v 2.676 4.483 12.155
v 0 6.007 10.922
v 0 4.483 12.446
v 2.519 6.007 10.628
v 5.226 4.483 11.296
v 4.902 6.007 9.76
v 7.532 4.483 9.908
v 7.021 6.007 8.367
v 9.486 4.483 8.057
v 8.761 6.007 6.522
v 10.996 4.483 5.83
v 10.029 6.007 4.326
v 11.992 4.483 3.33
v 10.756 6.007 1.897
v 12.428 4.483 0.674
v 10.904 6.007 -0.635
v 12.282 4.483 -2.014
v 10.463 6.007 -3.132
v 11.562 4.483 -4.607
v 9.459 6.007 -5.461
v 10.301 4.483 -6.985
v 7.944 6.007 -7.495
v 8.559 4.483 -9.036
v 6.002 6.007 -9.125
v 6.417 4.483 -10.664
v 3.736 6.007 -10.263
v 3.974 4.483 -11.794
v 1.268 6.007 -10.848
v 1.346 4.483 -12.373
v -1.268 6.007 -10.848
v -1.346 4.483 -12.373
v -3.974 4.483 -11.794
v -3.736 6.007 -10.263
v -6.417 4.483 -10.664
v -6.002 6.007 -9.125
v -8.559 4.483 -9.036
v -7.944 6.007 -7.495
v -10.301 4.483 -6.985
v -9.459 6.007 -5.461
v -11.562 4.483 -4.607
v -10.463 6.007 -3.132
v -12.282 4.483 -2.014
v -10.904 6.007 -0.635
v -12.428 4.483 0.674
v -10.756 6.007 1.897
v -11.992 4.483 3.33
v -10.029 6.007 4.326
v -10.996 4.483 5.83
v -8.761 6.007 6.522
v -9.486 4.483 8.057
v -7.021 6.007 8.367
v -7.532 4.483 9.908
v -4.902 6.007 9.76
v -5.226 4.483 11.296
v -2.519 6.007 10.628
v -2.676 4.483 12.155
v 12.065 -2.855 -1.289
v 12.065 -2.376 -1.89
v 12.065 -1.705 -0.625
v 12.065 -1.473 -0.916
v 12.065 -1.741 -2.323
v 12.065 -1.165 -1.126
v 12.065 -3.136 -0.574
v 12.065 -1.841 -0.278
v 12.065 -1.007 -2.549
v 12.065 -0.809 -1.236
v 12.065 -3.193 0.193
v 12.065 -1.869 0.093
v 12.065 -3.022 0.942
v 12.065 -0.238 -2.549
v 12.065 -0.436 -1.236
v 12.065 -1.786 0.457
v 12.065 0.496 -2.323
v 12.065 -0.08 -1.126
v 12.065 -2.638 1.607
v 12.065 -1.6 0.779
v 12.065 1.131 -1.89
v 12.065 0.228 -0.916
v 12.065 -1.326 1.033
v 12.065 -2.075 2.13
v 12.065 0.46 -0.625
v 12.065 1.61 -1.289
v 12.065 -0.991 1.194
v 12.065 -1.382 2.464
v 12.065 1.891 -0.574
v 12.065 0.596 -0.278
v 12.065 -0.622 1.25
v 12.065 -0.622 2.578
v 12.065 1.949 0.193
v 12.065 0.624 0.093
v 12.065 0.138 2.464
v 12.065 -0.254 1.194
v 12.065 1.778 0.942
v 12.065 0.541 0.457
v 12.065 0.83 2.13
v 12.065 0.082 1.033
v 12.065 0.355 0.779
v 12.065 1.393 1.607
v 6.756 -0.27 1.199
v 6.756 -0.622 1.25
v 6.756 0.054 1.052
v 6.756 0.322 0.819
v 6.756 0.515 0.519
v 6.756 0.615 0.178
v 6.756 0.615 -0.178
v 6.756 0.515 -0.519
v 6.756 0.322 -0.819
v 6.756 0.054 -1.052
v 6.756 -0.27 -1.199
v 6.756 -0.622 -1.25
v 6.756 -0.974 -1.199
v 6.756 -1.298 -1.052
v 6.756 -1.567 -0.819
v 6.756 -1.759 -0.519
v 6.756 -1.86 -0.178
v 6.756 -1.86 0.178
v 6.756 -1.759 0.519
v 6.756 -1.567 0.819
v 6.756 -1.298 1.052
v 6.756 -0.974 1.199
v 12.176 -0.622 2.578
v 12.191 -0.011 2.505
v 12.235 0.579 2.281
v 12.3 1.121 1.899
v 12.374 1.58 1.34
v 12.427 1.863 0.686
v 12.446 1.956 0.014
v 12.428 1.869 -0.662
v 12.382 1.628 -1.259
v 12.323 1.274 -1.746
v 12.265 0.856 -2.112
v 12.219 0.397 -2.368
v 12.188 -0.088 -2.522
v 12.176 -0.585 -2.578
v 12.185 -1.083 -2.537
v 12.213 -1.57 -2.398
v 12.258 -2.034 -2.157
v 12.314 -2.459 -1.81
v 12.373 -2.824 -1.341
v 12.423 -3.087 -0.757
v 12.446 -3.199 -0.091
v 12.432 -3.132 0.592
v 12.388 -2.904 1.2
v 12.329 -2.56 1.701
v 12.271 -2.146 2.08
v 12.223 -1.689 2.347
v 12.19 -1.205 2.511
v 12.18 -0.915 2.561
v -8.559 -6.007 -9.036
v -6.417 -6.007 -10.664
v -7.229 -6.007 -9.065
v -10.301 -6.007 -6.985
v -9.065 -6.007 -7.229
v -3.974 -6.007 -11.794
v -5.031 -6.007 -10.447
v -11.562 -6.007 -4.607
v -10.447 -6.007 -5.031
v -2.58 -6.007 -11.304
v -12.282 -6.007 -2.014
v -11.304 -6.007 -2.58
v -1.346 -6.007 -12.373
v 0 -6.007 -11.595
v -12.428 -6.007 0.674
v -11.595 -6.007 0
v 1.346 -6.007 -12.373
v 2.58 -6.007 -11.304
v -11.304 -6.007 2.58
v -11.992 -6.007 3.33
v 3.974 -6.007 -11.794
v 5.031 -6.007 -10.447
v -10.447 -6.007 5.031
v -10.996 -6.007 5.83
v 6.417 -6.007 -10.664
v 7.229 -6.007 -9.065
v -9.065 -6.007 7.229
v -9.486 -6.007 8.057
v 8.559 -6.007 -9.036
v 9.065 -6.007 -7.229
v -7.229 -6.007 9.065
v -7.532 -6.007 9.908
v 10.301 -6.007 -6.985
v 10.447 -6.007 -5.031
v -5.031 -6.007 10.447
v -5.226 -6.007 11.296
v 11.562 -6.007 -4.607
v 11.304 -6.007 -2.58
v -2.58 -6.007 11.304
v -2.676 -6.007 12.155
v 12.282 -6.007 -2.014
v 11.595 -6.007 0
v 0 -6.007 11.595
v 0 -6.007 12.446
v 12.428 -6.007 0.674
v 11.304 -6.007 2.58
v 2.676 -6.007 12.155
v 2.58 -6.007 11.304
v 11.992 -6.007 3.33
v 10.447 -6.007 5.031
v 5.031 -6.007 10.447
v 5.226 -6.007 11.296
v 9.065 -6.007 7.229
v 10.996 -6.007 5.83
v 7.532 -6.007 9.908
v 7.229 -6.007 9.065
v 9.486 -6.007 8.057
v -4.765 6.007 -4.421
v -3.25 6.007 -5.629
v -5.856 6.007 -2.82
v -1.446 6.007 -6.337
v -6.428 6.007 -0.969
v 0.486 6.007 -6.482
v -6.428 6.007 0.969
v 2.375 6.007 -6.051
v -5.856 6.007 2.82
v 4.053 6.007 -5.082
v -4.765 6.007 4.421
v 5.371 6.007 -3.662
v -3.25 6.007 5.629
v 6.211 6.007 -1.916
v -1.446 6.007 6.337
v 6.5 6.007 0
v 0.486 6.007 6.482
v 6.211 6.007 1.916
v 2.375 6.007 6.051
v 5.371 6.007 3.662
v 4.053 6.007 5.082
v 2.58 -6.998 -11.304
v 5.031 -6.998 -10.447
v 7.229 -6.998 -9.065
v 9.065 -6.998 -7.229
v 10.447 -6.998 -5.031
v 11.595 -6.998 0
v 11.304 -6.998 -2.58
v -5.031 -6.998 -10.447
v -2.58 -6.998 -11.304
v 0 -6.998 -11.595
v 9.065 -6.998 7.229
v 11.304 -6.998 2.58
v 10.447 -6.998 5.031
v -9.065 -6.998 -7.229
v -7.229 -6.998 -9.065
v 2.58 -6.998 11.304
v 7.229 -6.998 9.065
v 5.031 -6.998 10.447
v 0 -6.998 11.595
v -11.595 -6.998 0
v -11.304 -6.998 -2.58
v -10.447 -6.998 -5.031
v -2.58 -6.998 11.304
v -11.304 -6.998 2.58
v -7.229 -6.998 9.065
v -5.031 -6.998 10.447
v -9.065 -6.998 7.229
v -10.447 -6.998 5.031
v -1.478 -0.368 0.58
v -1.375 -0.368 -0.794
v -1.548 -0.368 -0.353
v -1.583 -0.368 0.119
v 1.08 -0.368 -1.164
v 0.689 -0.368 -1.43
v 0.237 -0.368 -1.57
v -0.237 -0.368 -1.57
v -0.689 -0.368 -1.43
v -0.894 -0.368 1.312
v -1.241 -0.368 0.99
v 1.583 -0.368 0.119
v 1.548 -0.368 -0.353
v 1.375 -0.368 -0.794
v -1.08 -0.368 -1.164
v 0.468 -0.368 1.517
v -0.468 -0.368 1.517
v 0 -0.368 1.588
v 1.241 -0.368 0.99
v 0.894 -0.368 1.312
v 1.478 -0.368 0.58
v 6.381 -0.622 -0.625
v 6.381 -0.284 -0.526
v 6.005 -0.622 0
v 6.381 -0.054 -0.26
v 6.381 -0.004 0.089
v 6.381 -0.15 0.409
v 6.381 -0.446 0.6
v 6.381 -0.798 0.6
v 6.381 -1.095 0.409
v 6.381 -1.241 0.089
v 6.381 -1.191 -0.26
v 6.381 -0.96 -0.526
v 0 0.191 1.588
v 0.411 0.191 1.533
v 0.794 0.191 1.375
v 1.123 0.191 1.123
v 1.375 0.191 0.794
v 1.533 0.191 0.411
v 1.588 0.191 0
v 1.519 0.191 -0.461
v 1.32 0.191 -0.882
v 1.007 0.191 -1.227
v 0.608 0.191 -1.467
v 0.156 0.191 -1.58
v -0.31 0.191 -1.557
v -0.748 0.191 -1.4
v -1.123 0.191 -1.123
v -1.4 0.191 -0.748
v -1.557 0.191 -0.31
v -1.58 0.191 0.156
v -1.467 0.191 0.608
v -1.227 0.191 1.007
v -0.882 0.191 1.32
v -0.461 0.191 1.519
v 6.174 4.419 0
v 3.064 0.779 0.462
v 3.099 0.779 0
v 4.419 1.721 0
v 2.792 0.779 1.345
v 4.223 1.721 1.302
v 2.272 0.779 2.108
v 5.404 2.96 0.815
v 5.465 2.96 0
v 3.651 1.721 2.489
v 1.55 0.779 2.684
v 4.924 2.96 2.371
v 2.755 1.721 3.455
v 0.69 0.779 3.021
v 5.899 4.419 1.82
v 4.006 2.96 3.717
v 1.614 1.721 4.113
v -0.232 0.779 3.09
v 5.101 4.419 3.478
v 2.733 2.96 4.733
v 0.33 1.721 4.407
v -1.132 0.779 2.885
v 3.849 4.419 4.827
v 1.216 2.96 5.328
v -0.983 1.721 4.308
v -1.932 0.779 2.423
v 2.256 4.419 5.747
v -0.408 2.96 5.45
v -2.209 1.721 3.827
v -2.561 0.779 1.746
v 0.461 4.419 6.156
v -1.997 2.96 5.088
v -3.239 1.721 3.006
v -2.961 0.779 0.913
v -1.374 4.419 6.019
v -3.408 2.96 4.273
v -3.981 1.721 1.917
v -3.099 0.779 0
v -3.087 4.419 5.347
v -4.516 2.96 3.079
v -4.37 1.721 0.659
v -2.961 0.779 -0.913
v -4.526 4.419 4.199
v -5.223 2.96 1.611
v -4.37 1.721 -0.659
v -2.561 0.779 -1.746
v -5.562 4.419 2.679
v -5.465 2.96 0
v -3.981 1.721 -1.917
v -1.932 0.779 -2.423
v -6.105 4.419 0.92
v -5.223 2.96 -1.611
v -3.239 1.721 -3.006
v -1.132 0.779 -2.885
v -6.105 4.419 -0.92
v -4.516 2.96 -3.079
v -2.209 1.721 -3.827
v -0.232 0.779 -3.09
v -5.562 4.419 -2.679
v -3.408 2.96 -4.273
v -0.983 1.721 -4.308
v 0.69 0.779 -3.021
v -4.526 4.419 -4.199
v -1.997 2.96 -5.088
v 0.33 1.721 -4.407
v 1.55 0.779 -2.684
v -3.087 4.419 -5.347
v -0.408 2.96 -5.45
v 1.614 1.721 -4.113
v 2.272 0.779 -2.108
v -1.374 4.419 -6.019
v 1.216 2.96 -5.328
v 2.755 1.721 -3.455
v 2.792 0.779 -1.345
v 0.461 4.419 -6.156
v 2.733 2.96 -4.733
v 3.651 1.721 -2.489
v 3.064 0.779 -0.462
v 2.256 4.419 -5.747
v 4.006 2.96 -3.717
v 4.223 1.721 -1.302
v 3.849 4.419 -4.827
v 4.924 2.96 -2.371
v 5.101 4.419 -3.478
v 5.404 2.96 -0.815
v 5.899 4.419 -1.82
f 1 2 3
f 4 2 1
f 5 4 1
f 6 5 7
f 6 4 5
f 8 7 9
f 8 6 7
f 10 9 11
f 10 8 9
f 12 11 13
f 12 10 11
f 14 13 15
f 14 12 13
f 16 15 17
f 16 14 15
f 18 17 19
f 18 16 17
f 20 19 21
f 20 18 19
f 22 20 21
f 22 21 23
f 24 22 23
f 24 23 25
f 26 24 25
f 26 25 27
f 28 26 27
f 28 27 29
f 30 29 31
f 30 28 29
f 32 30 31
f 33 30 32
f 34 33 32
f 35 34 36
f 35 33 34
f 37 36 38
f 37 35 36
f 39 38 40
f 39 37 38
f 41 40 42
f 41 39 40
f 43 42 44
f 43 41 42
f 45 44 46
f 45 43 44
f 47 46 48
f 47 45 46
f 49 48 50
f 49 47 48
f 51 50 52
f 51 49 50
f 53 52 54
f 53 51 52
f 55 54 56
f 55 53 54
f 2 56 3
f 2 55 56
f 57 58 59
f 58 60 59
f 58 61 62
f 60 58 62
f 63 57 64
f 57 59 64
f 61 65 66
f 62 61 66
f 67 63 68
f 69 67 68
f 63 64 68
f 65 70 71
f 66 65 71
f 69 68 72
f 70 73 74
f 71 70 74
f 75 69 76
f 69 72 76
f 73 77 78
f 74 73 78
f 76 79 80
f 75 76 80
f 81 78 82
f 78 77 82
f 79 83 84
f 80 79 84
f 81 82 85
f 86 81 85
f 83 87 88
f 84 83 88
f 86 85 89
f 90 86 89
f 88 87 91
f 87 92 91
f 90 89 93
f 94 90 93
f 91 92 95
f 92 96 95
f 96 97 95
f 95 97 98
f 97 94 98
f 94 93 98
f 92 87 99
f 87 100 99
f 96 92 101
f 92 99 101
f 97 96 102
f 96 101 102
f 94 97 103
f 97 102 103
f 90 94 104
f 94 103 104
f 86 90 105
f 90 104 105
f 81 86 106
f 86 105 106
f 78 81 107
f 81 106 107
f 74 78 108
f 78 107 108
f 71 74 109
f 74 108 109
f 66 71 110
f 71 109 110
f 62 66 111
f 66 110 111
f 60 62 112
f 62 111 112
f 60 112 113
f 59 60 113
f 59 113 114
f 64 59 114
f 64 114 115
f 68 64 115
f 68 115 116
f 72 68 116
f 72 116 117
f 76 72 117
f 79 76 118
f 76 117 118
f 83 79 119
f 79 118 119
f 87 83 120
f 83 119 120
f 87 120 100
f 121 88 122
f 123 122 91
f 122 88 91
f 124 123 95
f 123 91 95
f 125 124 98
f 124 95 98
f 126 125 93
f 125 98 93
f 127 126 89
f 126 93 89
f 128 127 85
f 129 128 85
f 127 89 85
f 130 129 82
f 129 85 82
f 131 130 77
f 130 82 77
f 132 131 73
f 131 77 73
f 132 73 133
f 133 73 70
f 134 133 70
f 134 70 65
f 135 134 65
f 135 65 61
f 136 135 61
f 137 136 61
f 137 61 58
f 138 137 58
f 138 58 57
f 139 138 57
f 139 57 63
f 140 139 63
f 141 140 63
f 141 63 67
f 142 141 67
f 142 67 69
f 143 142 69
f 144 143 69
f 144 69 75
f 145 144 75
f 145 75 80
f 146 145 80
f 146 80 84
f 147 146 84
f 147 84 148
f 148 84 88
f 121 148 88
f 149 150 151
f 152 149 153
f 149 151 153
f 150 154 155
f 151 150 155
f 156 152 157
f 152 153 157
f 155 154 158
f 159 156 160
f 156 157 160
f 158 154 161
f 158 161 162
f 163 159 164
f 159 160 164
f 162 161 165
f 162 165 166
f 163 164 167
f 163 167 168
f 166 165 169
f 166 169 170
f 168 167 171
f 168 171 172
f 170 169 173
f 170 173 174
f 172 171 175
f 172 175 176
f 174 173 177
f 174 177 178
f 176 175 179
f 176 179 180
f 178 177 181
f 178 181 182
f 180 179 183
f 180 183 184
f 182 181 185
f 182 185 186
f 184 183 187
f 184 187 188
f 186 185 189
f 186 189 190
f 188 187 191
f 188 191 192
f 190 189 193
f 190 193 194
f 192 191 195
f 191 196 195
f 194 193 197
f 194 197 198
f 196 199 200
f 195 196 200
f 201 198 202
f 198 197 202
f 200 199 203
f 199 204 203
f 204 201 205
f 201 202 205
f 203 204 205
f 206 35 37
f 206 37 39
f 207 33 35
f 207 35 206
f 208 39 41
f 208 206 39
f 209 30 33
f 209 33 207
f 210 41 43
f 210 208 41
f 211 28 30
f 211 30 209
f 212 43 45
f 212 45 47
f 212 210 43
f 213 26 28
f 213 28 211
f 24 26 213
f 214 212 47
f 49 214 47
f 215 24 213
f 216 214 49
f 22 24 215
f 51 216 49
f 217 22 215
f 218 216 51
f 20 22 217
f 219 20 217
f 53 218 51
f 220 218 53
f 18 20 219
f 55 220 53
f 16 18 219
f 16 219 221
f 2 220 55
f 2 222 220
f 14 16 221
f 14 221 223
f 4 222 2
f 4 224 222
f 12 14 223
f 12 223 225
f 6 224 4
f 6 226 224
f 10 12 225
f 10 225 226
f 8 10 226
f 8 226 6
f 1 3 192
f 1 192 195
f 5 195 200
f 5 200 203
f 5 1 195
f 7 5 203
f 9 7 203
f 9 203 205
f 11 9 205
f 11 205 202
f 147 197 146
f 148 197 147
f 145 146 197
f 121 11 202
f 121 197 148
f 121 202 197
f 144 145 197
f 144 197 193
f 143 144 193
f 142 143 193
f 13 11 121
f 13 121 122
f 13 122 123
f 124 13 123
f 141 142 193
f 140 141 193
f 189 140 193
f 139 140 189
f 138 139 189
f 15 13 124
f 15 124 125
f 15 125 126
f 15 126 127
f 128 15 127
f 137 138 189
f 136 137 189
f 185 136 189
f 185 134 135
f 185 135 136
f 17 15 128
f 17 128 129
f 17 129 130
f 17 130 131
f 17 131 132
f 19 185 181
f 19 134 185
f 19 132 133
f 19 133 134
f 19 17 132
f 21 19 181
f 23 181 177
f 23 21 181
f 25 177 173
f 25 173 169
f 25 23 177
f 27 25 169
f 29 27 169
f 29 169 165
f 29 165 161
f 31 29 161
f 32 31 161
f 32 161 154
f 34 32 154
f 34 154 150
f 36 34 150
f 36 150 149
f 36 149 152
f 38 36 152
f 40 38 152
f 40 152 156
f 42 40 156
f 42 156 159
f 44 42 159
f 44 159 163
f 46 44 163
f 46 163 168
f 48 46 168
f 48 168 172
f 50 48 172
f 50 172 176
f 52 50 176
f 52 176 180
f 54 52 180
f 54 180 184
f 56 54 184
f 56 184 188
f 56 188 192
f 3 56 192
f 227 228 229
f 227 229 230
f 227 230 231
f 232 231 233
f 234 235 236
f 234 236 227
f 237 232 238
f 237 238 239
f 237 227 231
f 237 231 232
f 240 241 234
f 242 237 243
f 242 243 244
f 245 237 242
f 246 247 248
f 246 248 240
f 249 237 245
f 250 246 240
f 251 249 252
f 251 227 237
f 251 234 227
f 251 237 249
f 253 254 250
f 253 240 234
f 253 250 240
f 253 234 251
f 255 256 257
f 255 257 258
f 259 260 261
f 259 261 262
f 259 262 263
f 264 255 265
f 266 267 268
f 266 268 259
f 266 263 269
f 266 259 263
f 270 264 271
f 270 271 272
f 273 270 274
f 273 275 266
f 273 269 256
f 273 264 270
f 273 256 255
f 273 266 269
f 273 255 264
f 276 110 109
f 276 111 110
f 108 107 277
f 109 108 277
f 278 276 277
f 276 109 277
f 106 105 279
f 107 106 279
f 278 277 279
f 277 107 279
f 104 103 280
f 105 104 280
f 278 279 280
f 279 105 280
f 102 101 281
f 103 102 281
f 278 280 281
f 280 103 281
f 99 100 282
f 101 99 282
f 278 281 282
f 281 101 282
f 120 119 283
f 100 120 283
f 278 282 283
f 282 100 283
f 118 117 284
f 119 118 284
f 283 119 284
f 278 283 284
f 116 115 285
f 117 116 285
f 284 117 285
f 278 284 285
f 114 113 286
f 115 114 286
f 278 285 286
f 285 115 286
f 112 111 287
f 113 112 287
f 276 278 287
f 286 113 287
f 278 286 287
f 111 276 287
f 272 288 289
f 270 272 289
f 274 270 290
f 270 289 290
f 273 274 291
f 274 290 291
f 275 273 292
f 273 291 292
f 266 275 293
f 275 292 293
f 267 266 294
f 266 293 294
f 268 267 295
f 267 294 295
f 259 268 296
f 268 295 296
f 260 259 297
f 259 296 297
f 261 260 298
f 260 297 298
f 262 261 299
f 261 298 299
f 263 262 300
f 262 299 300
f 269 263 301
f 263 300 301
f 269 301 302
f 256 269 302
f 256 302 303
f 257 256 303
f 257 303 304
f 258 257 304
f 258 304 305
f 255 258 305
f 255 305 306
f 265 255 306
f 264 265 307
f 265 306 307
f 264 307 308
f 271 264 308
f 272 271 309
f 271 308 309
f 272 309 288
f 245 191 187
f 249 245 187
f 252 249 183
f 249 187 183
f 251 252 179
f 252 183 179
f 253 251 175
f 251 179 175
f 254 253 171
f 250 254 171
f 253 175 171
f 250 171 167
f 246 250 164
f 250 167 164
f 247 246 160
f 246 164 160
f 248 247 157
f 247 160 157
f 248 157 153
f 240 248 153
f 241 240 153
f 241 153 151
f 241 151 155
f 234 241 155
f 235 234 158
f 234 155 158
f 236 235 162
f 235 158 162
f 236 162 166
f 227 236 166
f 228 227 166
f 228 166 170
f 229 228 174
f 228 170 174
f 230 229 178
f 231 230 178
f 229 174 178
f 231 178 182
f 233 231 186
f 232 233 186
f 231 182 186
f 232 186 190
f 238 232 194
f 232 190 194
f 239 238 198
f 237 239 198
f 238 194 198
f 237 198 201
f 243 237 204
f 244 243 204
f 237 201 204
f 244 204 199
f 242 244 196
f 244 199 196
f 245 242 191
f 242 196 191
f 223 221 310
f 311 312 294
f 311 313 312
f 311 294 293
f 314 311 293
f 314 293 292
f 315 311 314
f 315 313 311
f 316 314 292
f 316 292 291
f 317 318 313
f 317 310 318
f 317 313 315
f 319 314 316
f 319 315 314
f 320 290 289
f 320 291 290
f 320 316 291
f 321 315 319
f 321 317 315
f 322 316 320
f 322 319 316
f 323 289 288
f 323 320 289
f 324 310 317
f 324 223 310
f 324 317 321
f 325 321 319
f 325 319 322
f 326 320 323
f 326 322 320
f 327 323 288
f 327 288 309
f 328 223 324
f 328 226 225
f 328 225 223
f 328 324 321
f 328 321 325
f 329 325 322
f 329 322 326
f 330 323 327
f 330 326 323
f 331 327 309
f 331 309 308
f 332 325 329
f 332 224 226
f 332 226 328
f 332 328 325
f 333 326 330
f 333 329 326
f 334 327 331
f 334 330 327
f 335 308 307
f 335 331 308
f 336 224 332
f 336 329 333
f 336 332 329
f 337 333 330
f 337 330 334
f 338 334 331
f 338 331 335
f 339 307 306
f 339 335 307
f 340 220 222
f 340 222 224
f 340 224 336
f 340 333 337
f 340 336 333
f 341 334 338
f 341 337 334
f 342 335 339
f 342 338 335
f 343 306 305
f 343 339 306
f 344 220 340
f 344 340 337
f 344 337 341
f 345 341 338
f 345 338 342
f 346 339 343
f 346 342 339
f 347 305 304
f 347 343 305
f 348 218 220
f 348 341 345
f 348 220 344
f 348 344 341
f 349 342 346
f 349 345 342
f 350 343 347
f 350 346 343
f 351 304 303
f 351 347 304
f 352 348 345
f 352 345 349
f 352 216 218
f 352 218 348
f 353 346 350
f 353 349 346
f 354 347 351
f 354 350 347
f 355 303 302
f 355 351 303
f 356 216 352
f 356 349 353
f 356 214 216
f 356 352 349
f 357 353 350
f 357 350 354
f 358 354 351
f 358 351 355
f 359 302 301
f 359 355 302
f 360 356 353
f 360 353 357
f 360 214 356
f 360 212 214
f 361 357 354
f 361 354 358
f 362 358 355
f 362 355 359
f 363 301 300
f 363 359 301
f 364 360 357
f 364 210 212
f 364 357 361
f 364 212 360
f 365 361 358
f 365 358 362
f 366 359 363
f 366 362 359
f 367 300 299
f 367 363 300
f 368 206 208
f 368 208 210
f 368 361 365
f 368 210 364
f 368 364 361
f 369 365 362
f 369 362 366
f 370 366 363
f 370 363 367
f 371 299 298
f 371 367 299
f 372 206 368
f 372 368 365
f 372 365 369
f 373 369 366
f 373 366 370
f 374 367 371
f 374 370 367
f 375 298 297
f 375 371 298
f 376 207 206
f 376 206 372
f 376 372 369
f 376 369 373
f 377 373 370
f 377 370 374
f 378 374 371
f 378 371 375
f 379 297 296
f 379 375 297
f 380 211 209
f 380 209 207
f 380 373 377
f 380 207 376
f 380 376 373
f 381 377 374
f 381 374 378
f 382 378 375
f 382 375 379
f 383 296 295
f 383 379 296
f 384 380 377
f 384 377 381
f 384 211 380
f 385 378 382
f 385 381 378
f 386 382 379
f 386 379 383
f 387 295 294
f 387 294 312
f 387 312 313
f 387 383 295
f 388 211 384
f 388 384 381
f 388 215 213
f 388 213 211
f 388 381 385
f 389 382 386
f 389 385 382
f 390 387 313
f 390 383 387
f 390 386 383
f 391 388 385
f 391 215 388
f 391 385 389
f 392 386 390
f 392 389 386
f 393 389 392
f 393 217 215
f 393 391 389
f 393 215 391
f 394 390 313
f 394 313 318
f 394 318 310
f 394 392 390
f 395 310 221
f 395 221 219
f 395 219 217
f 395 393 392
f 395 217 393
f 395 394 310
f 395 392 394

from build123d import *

# Parameters (mm, degrees)
SKETCH1_R                          = 12.446
EXTRUDE1_DEPTH                     = 6.0071
CHAMFER1_SIZE                      = 1.524
SKETCH2_R                          = 11.5951
EXTRUDE2_DEPTH                     = 0.99076
SKETCH3_R                          = 1.5875
EXTRUDE3_DEPTH                     = 6.3754
F_5_16_0_3125_DIAMETER_HOLE2_D     = 5.1562
F_5_16_0_3125_DIAMETER_HOLE2_DEPTH = 0.381
M3X0_5_TAPPED_HOLE1_D              = 2.5
M3X0_5_TAPPED_HOLE1_DEPTH          = 5.3086
M3X0_5_TAPPED_HOLE1_TIP            = 0.751075774


with BuildPart() as part:
    # Sketch1 → Extrude1 (new body, symmetric)
    with BuildSketch(Plane(origin=(0, 0, 0), x_dir=(1, 0, 0), z_dir=(0, 1, 0))):
        with Locations(Location((0, 0, 0), (0, 0, 270))):  # turned: the seam where the file's is
            Circle(SKETCH1_R)
    extrude(amount=EXTRUDE1_DEPTH, both=True)

    # Chamfer1
    chamfer1_edges = [part.edges().sort_by_distance(p)[0] for p in [
        (0, 6.0071, -12.446),
    ]]
    chamfer(chamfer1_edges, length=CHAMFER1_SIZE)

    # Sketch2 → Extrude2 (add)
    with BuildSketch(Plane.XZ.offset(6.0071)):
        with Locations(Location((0, 0, 0), (0, 0, 90))):  # turned: the seam where the file's is
            Circle(SKETCH2_R)
    extrude(amount=EXTRUDE2_DEPTH)

    # Sketch3 → Extrude3 (cut)
    with BuildSketch(Plane(origin=(0, 6.0071, 0), x_dir=(1, 0, 0), z_dir=(0, 1, 0))):
        with Locations(Location((0, 0, 0), (0, 0, 270))):  # turned: the seam where the file's is
            Circle(SKETCH3_R)
    extrude(amount=-EXTRUDE3_DEPTH, mode=Mode.SUBTRACT)

    # Sketch4 → Cut-Revolve1 (revolve, cut)
    with BuildSketch(Plane.XY):
        with BuildLine():
            Line((0, 13.035099954), (0, -0.004899954))
            ThreePointArc((0, -0.004899954), (6.519999954, 6.5151), (0, 13.035099954))
        make_face()
    revolve(axis=Axis((0, 13.035099954, 0), (0, -1, 0)), mode=Mode.SUBTRACT)

    # 5/16 (0.3125) Diameter Hole2
    with Locations(Plane(origin=(12.446, 0, 0), x_dir=(0, 0, -1), z_dir=(1, 0, 0))):
        with Locations((0, -0.6223)):
            Hole(F_5_16_0_3125_DIAMETER_HOLE2_D / 2, depth=F_5_16_0_3125_DIAMETER_HOLE2_DEPTH)

    # M3x0.5 Tapped Hole1
    with Locations(Plane(origin=(12.065, 0, 0), x_dir=(0, 0, -1), z_dir=(1, 0, 0))):
        with Locations((0, -0.6223)):
            Hole(M3X0_5_TAPPED_HOLE1_D / 2, depth=M3X0_5_TAPPED_HOLE1_DEPTH)
            with Locations((0, 0, -(M3X0_5_TAPPED_HOLE1_DEPTH + M3X0_5_TAPPED_HOLE1_TIP / 2))):  # 118° drill point
                Cone(0, M3X0_5_TAPPED_HOLE1_D / 2, M3X0_5_TAPPED_HOLE1_TIP, mode=Mode.SUBTRACT)


solid = part.part
